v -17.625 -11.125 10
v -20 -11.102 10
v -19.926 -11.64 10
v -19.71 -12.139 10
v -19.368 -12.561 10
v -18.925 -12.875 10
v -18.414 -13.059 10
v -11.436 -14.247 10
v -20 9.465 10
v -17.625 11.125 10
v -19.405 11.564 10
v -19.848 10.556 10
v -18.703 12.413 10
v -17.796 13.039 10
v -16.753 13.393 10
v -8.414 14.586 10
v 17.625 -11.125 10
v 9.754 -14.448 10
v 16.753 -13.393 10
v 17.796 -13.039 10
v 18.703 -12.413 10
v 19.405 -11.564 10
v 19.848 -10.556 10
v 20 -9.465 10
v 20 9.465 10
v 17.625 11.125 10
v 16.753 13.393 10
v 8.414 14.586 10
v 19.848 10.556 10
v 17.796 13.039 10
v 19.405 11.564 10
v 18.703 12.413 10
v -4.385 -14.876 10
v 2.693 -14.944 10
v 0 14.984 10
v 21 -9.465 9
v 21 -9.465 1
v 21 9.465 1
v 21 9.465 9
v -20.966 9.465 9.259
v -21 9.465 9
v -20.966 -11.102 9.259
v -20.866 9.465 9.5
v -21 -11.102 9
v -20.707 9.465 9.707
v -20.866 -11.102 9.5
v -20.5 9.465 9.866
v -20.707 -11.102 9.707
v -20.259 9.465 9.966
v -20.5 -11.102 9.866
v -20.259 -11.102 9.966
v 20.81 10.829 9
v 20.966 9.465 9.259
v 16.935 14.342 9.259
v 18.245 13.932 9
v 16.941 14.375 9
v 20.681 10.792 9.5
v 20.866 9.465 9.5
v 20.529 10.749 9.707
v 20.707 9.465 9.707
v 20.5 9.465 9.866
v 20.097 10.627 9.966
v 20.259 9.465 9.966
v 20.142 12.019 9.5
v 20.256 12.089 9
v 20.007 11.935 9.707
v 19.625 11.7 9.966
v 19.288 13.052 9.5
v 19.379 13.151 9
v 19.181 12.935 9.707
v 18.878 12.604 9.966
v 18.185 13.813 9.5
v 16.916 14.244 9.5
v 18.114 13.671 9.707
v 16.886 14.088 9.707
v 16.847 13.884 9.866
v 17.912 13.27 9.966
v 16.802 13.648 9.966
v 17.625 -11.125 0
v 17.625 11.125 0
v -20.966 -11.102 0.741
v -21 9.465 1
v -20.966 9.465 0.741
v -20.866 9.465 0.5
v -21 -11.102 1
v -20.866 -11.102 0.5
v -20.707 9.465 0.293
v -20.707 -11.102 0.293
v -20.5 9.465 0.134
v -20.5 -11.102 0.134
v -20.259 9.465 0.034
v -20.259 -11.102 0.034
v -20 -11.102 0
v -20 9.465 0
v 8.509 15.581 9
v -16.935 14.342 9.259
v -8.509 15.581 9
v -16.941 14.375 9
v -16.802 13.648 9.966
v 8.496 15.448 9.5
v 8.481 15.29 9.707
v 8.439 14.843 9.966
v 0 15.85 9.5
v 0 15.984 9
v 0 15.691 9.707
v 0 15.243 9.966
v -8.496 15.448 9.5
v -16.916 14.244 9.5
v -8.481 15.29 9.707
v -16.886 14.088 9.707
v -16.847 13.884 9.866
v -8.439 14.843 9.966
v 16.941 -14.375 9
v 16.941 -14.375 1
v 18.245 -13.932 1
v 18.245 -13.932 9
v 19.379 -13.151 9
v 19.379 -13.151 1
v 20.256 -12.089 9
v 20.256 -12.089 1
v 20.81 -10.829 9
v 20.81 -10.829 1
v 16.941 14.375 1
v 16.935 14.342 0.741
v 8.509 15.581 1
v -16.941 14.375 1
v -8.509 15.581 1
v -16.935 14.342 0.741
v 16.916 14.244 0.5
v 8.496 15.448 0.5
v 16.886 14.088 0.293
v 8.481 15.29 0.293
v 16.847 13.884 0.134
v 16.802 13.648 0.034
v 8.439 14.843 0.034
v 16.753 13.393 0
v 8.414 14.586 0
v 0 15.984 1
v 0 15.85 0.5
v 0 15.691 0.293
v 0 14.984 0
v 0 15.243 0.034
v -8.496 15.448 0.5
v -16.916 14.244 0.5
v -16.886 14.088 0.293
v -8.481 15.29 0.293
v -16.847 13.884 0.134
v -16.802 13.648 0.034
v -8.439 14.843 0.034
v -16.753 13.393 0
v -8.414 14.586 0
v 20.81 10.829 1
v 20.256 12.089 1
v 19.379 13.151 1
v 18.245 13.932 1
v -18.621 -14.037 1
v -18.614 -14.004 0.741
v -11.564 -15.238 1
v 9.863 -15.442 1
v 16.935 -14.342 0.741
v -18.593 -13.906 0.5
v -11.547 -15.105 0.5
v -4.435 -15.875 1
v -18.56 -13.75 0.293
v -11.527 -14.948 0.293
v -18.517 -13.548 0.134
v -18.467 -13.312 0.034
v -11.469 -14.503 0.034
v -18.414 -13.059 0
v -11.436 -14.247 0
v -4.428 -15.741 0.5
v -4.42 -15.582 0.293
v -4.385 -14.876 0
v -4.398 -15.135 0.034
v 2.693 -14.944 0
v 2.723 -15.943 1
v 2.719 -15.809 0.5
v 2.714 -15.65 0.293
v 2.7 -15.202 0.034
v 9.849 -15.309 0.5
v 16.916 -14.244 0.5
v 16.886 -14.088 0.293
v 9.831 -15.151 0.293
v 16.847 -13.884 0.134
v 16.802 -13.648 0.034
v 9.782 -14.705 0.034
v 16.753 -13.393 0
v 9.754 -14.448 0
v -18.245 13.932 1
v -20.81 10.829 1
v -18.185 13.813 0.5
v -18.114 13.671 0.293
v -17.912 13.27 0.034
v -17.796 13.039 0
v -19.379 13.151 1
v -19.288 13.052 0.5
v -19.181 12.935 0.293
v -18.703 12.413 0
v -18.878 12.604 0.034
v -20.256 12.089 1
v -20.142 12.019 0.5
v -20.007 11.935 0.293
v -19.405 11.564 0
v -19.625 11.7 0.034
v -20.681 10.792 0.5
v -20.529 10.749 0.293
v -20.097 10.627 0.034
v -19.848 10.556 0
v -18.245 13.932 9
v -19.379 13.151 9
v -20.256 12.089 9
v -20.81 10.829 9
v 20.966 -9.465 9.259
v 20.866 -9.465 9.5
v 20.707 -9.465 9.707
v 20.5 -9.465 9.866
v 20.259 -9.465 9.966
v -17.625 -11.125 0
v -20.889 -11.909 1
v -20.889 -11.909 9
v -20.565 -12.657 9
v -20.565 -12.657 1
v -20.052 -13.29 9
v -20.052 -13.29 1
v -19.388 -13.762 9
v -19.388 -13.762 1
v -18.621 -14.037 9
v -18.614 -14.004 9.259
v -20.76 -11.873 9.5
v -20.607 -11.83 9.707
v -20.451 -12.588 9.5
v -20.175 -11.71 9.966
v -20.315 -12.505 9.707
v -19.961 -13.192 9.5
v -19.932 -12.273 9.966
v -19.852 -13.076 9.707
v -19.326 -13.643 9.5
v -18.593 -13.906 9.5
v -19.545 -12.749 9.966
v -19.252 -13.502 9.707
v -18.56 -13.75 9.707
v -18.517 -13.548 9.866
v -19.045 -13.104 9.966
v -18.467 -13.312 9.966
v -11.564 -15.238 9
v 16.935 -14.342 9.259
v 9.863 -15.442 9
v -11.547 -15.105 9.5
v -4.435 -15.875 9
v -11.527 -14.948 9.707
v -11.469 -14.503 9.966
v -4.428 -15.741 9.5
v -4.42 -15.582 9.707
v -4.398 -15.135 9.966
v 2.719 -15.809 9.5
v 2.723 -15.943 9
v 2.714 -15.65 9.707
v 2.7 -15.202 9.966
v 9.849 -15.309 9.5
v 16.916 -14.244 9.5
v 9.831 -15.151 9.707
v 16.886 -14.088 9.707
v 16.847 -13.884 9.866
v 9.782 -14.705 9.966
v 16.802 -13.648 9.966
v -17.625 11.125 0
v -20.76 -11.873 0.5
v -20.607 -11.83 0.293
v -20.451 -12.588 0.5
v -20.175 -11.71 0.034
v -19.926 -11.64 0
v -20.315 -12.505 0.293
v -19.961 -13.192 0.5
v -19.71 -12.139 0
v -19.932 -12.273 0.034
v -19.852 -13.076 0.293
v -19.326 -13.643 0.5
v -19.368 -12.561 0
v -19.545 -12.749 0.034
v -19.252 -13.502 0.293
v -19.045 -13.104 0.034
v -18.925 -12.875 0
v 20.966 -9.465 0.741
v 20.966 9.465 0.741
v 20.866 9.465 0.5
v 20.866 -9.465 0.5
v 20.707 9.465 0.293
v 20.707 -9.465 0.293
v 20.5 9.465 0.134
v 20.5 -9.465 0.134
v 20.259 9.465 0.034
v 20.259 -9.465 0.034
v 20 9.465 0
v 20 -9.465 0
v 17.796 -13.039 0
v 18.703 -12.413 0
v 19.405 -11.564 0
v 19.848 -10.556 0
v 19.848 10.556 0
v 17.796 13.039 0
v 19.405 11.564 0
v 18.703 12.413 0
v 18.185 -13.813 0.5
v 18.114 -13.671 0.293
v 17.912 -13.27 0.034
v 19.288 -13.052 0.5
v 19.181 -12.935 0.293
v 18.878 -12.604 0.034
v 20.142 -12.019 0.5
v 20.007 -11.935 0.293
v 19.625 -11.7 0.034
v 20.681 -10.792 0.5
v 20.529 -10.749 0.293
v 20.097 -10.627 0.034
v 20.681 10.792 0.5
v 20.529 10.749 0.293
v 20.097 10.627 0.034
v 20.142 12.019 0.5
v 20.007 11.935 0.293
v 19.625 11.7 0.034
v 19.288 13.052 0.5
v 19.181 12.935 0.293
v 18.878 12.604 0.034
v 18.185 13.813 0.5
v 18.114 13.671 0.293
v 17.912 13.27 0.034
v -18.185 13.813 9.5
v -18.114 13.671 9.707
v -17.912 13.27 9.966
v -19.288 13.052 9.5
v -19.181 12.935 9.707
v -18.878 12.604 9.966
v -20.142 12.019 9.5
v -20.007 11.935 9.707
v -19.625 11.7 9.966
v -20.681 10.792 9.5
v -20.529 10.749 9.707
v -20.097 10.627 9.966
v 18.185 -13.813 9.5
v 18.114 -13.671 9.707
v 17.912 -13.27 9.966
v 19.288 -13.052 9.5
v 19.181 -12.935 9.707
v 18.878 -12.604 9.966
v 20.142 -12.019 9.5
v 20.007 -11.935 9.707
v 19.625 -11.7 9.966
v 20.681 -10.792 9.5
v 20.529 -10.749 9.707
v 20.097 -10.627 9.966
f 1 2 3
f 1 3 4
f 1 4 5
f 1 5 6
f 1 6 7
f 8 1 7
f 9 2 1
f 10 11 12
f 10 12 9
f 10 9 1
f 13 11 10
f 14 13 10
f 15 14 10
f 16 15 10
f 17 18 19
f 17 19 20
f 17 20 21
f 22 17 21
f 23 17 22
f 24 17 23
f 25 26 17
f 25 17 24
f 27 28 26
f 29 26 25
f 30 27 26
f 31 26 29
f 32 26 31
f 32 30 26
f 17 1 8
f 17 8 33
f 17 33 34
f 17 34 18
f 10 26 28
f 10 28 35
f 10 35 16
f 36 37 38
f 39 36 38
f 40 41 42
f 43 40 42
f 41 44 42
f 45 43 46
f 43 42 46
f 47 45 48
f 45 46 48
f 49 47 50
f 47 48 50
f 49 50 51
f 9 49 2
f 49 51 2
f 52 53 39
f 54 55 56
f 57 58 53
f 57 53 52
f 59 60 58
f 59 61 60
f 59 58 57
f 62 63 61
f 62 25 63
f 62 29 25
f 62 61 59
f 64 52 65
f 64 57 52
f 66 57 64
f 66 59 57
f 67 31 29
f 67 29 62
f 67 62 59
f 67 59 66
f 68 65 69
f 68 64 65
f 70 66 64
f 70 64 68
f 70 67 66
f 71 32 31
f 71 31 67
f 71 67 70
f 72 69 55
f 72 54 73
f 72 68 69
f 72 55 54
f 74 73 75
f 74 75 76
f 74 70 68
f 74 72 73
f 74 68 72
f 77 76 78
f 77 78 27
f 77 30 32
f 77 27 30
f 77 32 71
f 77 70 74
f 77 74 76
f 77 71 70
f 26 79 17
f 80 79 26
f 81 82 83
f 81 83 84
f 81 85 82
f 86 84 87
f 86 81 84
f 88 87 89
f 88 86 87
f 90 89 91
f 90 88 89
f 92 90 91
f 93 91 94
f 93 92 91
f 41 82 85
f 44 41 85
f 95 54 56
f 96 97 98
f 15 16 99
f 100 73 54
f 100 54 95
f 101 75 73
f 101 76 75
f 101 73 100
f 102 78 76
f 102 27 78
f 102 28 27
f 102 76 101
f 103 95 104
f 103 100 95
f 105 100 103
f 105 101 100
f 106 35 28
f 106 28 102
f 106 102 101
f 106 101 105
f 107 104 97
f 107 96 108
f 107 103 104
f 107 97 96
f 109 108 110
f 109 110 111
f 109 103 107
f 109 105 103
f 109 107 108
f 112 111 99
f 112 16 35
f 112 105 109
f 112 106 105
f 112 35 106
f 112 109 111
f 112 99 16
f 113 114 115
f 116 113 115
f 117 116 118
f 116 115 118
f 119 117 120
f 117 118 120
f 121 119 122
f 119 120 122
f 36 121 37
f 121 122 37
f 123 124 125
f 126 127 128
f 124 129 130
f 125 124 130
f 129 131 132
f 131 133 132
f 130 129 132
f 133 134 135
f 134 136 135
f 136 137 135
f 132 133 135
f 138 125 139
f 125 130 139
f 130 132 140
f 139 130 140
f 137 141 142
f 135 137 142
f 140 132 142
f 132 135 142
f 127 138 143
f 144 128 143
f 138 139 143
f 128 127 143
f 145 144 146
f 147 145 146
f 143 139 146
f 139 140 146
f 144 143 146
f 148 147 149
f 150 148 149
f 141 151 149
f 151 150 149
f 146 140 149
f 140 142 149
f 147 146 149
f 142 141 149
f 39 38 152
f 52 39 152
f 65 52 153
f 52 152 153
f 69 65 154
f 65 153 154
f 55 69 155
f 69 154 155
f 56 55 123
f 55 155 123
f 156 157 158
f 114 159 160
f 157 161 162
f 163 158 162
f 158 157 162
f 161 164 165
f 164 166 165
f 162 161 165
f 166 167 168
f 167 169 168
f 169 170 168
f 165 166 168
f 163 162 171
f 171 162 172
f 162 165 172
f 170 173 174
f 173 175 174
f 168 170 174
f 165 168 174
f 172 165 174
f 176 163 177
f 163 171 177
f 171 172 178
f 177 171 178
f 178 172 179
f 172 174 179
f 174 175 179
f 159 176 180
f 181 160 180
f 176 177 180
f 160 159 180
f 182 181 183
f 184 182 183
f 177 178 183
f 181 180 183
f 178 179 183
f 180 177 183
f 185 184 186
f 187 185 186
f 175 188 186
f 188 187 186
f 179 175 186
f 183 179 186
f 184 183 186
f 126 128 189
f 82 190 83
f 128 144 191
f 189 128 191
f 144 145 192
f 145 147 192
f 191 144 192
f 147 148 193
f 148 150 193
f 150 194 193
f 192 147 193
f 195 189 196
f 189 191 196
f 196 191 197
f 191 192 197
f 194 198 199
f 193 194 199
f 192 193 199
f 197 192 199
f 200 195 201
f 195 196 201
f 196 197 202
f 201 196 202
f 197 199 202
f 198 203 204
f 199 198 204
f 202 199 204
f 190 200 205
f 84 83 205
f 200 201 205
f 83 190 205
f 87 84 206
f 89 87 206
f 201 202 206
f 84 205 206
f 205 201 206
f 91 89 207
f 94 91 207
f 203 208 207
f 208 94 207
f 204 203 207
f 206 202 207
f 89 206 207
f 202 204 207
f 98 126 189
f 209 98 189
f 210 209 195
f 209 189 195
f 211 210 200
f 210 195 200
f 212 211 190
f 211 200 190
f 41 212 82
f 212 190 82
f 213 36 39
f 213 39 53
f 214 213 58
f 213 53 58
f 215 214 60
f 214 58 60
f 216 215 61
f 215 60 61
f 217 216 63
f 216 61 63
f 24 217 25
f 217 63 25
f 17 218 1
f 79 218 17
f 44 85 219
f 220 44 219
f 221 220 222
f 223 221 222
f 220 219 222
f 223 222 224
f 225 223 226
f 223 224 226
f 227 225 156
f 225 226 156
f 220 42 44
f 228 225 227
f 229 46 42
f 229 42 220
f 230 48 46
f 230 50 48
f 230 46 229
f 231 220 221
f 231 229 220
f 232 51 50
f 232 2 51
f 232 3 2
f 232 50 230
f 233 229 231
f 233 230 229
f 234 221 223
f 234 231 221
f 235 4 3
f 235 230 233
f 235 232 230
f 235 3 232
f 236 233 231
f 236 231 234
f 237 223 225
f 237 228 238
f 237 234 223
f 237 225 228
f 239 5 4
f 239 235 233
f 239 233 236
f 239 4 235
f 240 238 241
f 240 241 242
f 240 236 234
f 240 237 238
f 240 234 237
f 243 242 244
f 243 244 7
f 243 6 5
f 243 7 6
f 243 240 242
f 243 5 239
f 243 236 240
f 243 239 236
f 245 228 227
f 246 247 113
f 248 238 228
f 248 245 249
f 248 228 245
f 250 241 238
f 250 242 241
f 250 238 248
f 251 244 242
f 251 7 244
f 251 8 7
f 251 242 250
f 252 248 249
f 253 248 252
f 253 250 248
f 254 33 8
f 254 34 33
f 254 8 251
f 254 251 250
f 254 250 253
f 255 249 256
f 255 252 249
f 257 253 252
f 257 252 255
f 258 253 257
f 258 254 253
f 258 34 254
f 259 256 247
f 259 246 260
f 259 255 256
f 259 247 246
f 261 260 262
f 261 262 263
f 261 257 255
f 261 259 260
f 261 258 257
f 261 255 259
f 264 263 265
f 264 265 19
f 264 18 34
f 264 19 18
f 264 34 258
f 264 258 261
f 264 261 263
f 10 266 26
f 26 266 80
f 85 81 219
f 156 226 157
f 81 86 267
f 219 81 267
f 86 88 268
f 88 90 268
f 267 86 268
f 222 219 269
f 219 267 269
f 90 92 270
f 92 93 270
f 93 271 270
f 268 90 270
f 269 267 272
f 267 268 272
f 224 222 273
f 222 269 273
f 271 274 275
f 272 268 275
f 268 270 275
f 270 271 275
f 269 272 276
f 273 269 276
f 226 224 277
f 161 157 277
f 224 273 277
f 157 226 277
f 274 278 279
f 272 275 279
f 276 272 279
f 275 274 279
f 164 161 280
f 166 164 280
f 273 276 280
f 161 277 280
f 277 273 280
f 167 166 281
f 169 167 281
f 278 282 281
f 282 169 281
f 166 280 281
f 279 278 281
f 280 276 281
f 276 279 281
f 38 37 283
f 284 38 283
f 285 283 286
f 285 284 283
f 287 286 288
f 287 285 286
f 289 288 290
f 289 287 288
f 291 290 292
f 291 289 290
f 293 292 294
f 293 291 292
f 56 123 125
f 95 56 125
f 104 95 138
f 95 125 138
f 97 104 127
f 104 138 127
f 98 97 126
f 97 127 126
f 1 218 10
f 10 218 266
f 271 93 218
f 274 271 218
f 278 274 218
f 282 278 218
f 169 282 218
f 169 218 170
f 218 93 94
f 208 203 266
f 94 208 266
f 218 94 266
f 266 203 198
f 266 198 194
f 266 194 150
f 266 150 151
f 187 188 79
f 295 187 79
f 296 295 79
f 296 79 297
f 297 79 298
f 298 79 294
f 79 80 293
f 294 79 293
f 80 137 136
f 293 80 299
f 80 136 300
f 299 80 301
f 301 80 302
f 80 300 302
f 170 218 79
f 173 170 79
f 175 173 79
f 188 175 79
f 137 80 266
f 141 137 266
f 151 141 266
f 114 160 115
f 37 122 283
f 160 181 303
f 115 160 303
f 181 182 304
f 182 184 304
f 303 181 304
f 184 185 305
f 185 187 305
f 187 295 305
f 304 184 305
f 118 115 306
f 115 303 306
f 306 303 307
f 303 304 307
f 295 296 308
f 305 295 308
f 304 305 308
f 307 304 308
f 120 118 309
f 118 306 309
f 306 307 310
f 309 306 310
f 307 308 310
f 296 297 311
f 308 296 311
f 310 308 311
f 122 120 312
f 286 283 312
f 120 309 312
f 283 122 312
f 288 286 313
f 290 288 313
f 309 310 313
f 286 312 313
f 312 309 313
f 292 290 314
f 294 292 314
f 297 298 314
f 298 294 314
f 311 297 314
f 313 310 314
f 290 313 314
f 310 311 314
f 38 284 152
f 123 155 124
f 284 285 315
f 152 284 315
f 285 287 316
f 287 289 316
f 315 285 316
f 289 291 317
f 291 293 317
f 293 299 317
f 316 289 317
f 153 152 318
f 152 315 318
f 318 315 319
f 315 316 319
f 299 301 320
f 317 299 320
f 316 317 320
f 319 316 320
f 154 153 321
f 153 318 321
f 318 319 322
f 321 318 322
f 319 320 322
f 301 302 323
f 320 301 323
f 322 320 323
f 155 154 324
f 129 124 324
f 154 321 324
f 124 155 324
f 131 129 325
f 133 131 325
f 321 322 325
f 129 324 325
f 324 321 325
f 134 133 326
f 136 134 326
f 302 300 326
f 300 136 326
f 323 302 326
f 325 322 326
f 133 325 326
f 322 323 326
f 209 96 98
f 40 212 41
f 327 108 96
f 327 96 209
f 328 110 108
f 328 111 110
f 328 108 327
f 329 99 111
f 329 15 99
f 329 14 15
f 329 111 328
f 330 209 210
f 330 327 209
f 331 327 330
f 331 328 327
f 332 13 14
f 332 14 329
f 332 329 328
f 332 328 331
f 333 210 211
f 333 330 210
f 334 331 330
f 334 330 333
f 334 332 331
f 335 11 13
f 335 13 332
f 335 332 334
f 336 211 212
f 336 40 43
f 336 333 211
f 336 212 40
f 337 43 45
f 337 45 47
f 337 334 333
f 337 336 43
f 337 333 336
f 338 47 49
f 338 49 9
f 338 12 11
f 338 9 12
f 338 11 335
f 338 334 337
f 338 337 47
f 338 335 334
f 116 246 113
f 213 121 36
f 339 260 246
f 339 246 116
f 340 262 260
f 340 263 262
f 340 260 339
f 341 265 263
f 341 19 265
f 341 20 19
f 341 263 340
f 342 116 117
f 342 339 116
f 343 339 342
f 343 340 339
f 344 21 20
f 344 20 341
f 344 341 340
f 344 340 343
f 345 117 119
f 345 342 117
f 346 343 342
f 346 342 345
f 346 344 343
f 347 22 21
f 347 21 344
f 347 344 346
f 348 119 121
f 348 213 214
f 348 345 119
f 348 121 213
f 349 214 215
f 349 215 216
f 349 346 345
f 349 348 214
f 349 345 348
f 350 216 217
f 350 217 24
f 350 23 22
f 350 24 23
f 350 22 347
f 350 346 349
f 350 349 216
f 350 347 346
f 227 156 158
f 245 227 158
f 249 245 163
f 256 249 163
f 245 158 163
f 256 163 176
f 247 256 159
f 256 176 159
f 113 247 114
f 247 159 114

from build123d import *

# Parameters (mm, degrees)
F0_W     = 35.25
F0_H     = 22.25
F1_DEPTH = 10
F2_R     = 1


with BuildPart() as f1:
    # F0 (on Top) → F1 (new body)
    with BuildSketch(Plane.XY):
        with BuildLine():
            Line((21, -9.464824), (21, 9.464824))
            ThreePointArc((21, 9.464824), (19.853951, 12.650269), (16.941176, 14.375444))
            ThreePointArc((16.941176, 14.375444), (0, 15.984287), (-16.941176, 14.375444))
            ThreePointArc((-16.941176, 14.375444), (-19.853951, 12.650269), (-21, 9.464824))
            Line((-21, 9.464824), (-21, -11.101853))
            ThreePointArc((-21, -11.101853), (-20.330458, -12.991023), (-18.62069, -14.036941))
            ThreePointArc((-18.62069, -14.036941), (-0.856643, -15.98021), (16.941176, -14.375444))
            ThreePointArc((16.941176, -14.375444), (19.853951, -12.650269), (21, -9.464824))
        make_face()
        Rectangle(F0_W, F0_H, mode=Mode.SUBTRACT)
    extrude(amount=F1_DEPTH)

    # F2
    f2_edges = [f1.edges().sort_by_distance(p)[0] for p in [
        (19.853951, 12.650269, 10),
        (19.853951, 12.650269, 0),
    ]]
    fillet(f2_edges, radius=F2_R)


solid = f1.part
